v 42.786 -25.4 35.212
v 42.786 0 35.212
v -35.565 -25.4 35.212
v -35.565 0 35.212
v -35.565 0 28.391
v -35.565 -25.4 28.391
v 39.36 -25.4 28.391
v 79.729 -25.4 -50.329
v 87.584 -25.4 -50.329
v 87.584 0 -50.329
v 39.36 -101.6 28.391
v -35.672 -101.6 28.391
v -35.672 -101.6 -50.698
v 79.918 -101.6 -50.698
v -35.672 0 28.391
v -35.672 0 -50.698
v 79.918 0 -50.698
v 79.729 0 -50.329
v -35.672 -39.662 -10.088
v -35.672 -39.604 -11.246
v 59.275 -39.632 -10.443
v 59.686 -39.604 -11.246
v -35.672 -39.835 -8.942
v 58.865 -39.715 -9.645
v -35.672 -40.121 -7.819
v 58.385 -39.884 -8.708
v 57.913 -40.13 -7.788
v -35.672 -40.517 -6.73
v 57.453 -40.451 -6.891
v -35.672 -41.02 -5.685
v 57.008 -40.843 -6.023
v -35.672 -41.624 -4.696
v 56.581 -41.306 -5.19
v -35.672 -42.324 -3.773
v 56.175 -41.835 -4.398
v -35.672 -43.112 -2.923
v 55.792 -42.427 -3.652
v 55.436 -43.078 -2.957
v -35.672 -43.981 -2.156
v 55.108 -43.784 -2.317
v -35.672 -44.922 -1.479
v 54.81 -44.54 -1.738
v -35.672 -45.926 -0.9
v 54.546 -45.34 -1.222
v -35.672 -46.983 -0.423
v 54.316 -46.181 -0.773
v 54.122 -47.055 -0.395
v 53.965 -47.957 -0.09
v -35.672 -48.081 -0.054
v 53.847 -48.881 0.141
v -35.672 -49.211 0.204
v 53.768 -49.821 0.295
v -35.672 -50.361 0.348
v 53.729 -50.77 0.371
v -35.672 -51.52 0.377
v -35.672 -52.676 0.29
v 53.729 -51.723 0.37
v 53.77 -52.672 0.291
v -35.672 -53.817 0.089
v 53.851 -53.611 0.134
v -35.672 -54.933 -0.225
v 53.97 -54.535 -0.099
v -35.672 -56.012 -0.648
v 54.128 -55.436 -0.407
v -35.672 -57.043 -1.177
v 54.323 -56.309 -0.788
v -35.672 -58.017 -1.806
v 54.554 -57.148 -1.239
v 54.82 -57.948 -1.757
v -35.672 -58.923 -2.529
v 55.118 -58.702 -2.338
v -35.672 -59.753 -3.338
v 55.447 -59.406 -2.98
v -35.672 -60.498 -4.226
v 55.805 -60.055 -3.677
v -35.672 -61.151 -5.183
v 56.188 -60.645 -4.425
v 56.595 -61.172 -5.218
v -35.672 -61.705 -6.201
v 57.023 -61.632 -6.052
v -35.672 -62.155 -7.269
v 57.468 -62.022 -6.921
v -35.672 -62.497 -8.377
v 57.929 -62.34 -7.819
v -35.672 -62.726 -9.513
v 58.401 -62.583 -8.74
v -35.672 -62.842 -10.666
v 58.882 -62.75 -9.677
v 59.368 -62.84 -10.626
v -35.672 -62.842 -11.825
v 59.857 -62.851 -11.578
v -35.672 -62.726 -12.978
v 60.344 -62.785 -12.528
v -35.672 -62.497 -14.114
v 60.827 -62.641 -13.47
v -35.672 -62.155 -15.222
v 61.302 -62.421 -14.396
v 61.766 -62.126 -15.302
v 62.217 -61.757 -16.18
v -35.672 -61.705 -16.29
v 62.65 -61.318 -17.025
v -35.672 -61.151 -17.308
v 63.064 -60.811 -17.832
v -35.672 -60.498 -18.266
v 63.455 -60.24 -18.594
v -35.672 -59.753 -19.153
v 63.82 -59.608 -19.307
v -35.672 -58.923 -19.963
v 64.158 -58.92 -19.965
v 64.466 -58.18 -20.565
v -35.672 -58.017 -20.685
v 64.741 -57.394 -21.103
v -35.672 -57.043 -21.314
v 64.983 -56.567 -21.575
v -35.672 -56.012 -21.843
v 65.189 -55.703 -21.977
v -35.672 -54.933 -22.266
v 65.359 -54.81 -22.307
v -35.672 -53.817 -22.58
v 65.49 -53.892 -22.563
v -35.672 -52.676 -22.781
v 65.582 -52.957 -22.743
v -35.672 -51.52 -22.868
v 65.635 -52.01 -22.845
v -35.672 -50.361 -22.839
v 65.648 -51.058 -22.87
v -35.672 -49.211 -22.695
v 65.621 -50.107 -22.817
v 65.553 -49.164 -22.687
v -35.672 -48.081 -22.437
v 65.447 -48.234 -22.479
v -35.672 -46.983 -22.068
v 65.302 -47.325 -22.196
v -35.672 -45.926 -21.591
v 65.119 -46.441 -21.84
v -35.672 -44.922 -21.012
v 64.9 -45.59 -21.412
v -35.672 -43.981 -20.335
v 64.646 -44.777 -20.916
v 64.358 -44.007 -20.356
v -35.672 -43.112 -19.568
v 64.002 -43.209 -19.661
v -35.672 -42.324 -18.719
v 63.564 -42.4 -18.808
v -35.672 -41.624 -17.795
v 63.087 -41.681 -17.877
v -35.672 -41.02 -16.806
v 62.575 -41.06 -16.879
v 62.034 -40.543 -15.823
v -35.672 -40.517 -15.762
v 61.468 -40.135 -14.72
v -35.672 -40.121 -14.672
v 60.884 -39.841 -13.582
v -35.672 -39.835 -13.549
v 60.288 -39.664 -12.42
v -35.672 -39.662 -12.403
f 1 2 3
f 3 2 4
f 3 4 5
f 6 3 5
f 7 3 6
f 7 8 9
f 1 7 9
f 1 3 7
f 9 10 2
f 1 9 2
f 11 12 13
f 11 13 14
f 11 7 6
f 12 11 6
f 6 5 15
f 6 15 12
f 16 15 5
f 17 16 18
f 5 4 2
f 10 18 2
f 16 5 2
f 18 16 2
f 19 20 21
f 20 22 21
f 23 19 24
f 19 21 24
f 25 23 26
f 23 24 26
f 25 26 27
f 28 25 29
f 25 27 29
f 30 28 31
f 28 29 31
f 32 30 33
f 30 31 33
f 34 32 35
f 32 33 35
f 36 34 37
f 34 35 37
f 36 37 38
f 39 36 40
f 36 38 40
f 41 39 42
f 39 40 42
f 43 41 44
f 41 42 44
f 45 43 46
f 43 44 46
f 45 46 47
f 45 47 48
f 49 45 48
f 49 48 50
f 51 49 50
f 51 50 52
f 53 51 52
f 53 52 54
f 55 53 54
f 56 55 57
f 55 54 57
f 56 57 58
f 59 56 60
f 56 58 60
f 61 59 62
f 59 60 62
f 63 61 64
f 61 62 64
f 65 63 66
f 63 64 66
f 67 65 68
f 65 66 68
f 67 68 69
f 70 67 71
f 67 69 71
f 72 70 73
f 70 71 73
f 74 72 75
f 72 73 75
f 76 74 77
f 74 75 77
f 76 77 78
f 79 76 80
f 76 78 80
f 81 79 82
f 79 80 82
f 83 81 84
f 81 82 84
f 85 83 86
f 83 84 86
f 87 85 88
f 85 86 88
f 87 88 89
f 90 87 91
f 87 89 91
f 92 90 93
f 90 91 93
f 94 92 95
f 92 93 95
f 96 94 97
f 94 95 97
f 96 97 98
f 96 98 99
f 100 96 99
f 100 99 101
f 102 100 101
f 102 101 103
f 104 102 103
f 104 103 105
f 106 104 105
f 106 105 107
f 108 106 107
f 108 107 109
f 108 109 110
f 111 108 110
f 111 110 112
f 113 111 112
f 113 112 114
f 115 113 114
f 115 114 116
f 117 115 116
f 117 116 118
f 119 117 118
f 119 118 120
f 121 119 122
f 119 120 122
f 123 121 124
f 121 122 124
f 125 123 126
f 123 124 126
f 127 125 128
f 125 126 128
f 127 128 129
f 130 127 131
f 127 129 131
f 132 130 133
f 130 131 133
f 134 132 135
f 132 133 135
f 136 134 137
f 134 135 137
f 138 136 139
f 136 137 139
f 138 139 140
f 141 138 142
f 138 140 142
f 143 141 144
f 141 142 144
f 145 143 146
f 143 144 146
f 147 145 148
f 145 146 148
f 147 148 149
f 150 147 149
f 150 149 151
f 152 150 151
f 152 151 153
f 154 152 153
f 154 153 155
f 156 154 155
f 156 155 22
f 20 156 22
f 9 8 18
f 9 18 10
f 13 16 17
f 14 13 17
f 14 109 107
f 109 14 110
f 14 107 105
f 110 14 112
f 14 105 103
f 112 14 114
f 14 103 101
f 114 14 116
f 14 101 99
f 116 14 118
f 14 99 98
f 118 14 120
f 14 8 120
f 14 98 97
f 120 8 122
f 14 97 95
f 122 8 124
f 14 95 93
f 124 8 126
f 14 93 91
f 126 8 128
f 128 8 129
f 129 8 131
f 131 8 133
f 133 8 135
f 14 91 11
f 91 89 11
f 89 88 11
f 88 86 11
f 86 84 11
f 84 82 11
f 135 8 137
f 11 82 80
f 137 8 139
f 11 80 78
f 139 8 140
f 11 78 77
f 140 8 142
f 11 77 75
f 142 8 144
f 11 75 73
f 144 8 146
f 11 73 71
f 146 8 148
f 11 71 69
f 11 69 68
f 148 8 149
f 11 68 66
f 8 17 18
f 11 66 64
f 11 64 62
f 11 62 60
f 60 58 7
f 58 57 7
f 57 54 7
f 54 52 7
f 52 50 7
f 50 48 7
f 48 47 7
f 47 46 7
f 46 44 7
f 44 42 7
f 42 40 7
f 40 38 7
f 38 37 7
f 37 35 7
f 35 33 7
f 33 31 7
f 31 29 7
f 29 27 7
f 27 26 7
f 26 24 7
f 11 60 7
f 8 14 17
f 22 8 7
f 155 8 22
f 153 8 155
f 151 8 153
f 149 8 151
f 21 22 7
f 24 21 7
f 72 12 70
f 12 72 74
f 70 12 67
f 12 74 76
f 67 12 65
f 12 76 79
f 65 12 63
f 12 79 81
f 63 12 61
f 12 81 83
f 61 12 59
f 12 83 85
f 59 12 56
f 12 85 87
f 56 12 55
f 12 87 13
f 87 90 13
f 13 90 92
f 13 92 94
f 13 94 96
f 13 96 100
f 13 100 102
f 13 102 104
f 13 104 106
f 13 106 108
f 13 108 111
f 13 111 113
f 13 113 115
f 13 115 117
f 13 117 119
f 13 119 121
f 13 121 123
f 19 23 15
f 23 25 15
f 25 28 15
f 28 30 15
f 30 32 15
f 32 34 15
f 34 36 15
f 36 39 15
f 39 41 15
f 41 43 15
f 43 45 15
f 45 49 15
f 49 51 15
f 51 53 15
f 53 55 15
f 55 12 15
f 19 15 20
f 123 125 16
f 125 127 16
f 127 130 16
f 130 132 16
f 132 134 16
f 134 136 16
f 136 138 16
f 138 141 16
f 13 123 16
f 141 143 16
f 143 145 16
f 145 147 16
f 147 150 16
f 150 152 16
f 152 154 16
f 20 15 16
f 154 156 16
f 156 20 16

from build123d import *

# Parameters (mm, degrees)
F1_DEPTH = 101.6
F2_R     = 11.6260505805
F3_DEPTH = 88.9
F5_DEPTH = 25.4


with BuildPart() as f1:
    # F0 (on Front) → F1 (new body)
    with BuildSketch(Plane.XZ):
        Polygon((39.3597595394, 28.3906441182), (-35.6722733648, 28.3906441182), (-35.6722733648, -50.6975799799), (39.3597595394, -50.6975799799), (79.9182447382, -50.6975799799), align=None)
    extrude(amount=F1_DEPTH)

    # F2 (on Right) → F3 (cut, symmetric)
    with BuildSketch(Plane.YZ):
        with Locations((-51.2301623821, -11.2456455827)):
            Circle(F2_R)
    extrude(amount=F3_DEPTH, both=True, mode=Mode.SUBTRACT)

    # F4 (on Front) → F5 (join)
    with BuildSketch(Plane.XZ):
        Polygon((-35.5649143457, 35.2117754519), (-35.5649143457, -50.3288730979), (87.5841230154, -50.3288730979), (42.7858941257, 35.2117754519), align=None)
    extrude(amount=F5_DEPTH)


solid = f1.part
